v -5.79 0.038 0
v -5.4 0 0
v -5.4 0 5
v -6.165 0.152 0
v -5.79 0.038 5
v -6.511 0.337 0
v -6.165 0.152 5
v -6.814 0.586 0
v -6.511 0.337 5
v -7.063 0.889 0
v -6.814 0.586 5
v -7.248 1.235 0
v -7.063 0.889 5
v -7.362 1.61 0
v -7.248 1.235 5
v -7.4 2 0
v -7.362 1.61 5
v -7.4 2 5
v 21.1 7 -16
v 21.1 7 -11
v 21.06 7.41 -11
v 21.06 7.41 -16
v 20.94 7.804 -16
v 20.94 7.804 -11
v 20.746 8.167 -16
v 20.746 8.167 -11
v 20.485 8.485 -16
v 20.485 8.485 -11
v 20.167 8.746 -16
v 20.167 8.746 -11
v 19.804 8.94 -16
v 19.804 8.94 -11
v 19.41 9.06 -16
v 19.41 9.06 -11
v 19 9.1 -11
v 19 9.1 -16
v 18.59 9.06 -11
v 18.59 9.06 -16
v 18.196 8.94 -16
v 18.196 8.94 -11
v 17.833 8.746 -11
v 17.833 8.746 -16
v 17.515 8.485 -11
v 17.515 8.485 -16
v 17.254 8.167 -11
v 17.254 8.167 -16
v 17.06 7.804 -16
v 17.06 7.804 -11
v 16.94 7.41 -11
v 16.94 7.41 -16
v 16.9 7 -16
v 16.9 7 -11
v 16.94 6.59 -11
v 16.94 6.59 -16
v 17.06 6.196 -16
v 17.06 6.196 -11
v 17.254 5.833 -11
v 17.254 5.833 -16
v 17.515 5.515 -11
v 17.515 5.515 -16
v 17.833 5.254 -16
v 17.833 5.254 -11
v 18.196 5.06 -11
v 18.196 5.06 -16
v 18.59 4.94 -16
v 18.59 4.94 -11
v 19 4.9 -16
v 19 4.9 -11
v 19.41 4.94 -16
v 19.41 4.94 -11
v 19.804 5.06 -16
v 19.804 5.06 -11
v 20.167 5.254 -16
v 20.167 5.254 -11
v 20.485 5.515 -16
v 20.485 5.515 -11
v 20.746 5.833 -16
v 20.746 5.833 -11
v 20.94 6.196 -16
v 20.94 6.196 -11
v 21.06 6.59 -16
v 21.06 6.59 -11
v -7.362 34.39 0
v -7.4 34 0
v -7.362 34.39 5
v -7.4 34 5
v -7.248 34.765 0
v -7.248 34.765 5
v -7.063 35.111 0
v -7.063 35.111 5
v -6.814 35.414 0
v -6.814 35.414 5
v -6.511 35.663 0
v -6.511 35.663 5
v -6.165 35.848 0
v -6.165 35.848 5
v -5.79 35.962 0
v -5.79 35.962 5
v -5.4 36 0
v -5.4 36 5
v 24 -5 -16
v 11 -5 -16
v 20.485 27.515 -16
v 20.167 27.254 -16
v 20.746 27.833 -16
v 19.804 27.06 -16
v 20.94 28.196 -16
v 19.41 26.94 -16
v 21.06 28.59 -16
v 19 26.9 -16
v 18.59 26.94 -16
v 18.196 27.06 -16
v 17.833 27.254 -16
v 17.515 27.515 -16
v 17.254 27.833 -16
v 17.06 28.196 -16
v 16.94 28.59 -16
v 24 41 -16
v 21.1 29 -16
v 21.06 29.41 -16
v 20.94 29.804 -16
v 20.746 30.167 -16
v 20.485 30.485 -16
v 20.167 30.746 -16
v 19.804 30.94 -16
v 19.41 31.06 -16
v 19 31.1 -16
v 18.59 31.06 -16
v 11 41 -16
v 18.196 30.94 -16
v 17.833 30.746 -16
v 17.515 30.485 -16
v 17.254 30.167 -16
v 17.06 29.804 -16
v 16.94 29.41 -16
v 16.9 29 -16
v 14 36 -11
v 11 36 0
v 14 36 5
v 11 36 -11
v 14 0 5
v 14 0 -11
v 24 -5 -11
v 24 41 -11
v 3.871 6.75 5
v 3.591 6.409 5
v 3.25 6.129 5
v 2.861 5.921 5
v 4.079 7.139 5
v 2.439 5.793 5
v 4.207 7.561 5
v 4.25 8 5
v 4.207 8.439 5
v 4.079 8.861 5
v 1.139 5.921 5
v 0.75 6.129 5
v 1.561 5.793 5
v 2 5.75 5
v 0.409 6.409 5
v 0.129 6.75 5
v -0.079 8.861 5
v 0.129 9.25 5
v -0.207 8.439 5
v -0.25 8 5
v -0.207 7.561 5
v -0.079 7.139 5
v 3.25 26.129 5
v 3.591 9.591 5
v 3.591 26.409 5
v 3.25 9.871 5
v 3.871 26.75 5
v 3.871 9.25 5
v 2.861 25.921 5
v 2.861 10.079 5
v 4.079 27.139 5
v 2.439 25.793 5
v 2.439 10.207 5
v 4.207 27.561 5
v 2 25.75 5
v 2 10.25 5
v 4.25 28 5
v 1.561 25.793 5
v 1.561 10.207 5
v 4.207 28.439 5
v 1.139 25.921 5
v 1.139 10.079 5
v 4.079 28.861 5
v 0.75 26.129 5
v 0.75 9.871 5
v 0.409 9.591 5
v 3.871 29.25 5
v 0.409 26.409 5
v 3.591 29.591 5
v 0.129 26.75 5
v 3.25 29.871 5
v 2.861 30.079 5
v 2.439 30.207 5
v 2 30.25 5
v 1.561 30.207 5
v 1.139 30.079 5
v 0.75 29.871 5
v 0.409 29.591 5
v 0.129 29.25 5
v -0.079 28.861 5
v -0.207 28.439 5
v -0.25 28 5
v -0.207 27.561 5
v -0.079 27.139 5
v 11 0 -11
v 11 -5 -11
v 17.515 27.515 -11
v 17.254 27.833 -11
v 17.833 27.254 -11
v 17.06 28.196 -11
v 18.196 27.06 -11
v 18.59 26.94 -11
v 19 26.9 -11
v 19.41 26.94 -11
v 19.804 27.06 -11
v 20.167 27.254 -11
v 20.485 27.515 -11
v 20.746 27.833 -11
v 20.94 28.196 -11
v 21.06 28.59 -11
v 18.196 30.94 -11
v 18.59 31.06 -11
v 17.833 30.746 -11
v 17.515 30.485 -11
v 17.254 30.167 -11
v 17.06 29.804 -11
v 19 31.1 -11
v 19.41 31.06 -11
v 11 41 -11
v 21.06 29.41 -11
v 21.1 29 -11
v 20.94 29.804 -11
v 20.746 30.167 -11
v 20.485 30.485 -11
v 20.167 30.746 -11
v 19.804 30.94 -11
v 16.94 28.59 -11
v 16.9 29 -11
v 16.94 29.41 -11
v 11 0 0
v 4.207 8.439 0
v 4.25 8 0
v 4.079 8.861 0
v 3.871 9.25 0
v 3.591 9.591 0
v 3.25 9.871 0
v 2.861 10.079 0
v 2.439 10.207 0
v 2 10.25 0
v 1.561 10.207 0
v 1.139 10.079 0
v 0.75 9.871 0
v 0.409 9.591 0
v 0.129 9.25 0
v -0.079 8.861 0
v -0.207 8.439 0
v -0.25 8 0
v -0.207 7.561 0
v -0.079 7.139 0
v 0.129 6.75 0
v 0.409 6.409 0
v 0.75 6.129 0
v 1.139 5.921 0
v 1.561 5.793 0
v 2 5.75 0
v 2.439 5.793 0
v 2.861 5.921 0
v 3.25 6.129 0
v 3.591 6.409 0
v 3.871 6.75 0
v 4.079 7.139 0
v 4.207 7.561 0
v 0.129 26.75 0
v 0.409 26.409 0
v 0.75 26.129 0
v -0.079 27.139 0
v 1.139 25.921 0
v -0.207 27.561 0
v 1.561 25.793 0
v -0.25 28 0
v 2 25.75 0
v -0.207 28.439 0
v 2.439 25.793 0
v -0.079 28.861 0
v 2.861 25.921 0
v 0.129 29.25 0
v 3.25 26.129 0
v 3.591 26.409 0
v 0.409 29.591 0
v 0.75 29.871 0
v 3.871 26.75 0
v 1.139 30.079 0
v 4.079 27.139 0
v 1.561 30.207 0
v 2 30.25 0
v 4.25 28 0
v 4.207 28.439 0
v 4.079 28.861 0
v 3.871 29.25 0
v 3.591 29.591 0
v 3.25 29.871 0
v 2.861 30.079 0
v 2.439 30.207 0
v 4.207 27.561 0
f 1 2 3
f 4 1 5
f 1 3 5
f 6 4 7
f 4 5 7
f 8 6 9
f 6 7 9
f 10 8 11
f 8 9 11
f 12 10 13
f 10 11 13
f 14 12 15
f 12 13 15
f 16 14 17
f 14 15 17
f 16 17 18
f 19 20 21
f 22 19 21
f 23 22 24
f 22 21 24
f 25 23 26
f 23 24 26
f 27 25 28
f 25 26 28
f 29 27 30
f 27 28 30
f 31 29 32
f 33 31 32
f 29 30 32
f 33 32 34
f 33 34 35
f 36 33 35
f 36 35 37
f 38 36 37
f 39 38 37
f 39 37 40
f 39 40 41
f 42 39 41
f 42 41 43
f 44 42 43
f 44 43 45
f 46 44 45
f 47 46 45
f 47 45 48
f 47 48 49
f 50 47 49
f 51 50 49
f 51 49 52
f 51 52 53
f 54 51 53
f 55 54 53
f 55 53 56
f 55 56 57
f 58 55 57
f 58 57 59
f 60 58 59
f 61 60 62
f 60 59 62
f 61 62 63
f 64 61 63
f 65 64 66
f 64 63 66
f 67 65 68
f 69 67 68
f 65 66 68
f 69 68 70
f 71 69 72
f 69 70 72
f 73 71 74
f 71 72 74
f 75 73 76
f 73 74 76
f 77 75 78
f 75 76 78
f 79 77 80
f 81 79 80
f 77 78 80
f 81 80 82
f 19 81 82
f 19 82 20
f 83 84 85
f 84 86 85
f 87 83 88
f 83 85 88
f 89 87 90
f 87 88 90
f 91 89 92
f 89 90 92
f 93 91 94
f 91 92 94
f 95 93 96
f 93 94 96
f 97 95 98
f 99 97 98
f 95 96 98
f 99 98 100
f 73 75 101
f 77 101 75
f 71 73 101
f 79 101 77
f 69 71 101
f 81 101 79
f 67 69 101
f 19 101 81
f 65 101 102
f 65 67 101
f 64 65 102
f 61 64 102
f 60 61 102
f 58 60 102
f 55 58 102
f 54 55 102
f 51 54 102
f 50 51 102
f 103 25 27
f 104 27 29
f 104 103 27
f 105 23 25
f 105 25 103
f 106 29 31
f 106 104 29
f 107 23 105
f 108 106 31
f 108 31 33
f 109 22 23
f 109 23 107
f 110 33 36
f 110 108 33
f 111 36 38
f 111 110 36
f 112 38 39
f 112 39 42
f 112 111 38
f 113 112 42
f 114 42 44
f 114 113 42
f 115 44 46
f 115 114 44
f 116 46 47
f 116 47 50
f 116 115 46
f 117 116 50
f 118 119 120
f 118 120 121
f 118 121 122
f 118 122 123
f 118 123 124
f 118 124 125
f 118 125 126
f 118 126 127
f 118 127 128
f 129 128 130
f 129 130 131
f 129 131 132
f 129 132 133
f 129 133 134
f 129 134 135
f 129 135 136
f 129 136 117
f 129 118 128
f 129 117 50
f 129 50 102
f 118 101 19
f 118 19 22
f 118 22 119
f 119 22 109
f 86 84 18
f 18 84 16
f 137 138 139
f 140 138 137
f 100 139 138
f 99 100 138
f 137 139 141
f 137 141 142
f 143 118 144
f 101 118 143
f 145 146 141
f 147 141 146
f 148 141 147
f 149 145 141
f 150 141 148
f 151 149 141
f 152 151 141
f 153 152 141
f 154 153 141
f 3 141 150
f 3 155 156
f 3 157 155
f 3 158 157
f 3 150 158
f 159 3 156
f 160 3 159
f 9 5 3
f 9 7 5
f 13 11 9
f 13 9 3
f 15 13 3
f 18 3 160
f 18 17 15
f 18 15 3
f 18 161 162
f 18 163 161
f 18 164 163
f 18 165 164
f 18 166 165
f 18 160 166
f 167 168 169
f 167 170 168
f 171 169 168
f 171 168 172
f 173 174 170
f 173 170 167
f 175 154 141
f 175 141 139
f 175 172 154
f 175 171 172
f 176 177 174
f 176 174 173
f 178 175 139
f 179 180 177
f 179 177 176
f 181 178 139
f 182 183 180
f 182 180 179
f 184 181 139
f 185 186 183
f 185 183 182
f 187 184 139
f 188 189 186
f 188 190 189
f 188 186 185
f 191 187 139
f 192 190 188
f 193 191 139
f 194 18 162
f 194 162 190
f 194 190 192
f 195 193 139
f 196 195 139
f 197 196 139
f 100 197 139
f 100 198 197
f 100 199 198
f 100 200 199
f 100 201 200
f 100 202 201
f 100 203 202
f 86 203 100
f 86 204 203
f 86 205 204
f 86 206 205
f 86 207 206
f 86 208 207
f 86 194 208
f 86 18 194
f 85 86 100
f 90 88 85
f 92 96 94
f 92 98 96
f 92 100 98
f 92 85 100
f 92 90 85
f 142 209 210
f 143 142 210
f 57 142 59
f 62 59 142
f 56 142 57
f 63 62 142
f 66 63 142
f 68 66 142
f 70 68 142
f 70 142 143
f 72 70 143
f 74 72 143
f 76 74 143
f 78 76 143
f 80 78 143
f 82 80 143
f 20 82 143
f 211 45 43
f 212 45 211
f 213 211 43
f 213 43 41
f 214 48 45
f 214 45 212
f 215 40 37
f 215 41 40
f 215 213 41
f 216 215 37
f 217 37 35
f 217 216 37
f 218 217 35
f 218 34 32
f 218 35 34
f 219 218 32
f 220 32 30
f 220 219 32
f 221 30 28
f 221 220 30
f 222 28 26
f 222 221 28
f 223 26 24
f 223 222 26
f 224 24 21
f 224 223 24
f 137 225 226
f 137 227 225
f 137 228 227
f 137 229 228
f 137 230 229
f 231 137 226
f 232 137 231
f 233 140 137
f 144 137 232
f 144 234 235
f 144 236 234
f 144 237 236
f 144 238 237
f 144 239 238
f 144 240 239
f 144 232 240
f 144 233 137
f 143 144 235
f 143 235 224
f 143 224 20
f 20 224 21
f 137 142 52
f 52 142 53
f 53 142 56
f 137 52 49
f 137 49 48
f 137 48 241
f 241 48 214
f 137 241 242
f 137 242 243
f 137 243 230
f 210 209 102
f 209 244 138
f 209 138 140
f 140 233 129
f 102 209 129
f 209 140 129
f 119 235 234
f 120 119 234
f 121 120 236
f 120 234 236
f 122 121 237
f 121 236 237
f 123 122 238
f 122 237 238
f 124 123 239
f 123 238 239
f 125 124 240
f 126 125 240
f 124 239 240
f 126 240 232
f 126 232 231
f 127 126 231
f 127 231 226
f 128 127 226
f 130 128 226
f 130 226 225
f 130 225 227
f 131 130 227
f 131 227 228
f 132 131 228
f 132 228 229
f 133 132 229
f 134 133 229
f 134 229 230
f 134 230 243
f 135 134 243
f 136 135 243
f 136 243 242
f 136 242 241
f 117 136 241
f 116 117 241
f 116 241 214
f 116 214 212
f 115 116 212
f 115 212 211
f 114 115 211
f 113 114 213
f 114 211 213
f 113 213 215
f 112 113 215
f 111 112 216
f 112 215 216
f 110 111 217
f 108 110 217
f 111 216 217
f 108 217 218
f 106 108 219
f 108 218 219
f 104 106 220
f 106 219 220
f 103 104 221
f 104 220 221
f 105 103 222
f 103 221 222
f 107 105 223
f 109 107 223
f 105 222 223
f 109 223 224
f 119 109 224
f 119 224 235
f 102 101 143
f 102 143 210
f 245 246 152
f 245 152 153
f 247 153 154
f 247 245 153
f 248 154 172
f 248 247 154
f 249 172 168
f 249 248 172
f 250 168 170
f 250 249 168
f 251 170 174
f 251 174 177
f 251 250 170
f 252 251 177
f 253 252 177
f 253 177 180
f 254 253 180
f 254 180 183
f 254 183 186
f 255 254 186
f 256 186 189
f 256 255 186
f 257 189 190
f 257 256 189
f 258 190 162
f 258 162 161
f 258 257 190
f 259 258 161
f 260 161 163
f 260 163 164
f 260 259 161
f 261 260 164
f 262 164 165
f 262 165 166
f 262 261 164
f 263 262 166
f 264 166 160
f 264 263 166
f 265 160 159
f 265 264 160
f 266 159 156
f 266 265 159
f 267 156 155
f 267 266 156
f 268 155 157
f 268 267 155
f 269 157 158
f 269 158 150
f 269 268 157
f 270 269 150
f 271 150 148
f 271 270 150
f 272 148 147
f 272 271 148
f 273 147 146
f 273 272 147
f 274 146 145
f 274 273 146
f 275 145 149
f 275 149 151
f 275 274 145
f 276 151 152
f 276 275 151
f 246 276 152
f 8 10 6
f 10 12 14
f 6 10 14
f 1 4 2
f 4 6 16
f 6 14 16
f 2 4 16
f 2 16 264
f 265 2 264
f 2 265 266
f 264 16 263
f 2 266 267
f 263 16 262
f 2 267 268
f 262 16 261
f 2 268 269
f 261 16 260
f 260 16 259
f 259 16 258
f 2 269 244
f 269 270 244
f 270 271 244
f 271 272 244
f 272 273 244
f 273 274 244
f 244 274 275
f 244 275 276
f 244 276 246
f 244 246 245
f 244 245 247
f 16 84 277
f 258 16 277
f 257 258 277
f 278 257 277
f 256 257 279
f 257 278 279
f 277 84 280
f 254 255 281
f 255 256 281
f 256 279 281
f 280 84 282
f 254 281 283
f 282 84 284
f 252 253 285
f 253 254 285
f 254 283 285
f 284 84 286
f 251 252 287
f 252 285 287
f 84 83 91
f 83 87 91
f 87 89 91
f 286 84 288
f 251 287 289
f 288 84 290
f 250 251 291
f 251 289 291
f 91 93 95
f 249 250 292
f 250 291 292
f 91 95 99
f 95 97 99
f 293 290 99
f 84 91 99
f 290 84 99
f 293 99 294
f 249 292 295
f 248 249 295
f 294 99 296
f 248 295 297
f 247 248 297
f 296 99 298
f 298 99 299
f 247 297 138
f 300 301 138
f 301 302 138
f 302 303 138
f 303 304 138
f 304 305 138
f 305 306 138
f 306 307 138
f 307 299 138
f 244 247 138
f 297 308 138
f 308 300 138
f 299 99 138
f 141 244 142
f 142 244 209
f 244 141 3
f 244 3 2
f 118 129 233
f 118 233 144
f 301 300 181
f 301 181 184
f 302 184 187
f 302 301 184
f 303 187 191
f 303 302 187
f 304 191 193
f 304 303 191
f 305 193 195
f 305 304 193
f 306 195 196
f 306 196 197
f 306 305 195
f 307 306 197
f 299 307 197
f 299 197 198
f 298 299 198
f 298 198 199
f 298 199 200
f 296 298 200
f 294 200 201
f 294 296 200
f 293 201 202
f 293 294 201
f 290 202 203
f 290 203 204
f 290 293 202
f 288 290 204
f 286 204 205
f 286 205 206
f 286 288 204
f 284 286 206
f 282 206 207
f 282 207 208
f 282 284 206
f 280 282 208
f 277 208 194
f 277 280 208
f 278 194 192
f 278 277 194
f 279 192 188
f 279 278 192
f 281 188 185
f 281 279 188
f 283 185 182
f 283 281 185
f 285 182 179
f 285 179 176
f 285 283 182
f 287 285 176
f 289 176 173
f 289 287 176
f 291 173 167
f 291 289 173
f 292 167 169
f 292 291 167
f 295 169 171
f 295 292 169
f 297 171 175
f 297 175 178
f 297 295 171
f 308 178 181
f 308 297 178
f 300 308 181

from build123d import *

# Parameters (mm, degrees)
ESQUISSE1_R             = 2.25
BOSS_EXTRU_1_DEPTH      = 5
BOSS_EXTRU_2_START      = -21
BOSS_EXTRU_2_DEPTH      = 21
ESQUISSE4_W             = 13
ESQUISSE4_H             = 46
ENL_V_MAT_EXTRU_2_DEPTH = 16
ESQUISSE9_W             = 16
ESQUISSE9_H             = 36
BOSS_EXTRU_3_DEPTH      = 3
ESQUISSE10_W            = 4
ESQUISSE10_H            = 16
ENL_V_MAT_EXTRU_6_DEPTH = 43
CONG_1_R                = 2
ESQUISSE11_R            = 2.1
ENL_V_MAT_EXTRU_7_DEPTH = 43


with BuildPart() as part:
    # Esquisse1 → Boss.-Extru.1 (new body)
    with BuildSketch(Plane.XY):
        with BuildLine():
            Line((-7.4, 36), (-7.4, 0))
            Line((-7.4, 0), (7, 0))
            ThreePointArc((7, 0), (9.121320344, 0.878679656), (10, 3))
            Line((10, 3), (10, 33))
            ThreePointArc((10, 33), (9.121320344, 35.121320344), (7, 36))
            Line((7, 36), (-7.4, 36))
        make_face()
        with Locations((2, 8)):
            Circle(ESQUISSE1_R, mode=Mode.SUBTRACT)
        with Locations((2, 28)):
            Circle(ESQUISSE1_R, mode=Mode.SUBTRACT)
    extrude(amount=BOSS_EXTRU_1_DEPTH)

    # Esquisse2 → Boss.-Extru.2 (add)
    with BuildSketch(Plane.XY.offset(5).offset(BOSS_EXTRU_2_START)):
        with BuildLine():
            Line((10, 3), (10, 33))
            ThreePointArc((10, 33), (9.121320344, 35.121320344), (7, 36))
            Line((7, 36), (11, 36))
            Line((11, 36), (11, 41))
            Line((11, 41), (24, 41))
            Line((24, 41), (24, -5))
            Line((24, -5), (11, -5))
            Line((11, -5), (11, 0))
            Line((11, 0), (7, 0))
            ThreePointArc((7, 0), (9.121320344, 0.878679656), (10, 3))
        make_face()
    extrude(amount=BOSS_EXTRU_2_DEPTH)

    # Esquisse4 → Enlèv. mat.-Extru.2 (cut)
    with BuildSketch(Plane.XY.offset(5)):
        with Locations((17.5, 18)):
            Rectangle(ESQUISSE4_W, ESQUISSE4_H)
    extrude(amount=-ENL_V_MAT_EXTRU_2_DEPTH, mode=Mode.SUBTRACT)

    # Esquisse9 → Boss.-Extru.3 (add)
    with BuildSketch(Plane(origin=(11, 0, 0), x_dir=(0, 0, -1), z_dir=(1, 0, 0))):
        with Locations((3, 18)):
            Rectangle(ESQUISSE9_W, ESQUISSE9_H)
    extrude(amount=BOSS_EXTRU_3_DEPTH)

    # Esquisse10 → Enlèv. mat.-Extru.6 (cut)
    with BuildSketch(Plane(origin=(0, 36, 0), x_dir=(1, 0, 0), z_dir=(0, 1, 0))):
        with Locations((9, 8)):
            Rectangle(ESQUISSE10_W, ESQUISSE10_H)
    extrude(amount=-ENL_V_MAT_EXTRU_6_DEPTH, mode=Mode.SUBTRACT)

    # Congé1
    cong_1_edges = [part.edges().sort_by_distance(p)[0] for p in [
        (-7.4, 0, 2.5),
        (-7.4, 36, 2.5),
    ]]
    fillet(cong_1_edges, radius=CONG_1_R)

    # Esquisse11 → Enlèv. mat.-Extru.7 (cut)
    with BuildSketch(Plane.XY.offset(-11)):
        with Locations((19, 29)):
            Circle(ESQUISSE11_R)
        with Locations((19, 7)):
            Circle(ESQUISSE11_R)
    extrude(amount=-ENL_V_MAT_EXTRU_7_DEPTH, mode=Mode.SUBTRACT)


solid = part.part
